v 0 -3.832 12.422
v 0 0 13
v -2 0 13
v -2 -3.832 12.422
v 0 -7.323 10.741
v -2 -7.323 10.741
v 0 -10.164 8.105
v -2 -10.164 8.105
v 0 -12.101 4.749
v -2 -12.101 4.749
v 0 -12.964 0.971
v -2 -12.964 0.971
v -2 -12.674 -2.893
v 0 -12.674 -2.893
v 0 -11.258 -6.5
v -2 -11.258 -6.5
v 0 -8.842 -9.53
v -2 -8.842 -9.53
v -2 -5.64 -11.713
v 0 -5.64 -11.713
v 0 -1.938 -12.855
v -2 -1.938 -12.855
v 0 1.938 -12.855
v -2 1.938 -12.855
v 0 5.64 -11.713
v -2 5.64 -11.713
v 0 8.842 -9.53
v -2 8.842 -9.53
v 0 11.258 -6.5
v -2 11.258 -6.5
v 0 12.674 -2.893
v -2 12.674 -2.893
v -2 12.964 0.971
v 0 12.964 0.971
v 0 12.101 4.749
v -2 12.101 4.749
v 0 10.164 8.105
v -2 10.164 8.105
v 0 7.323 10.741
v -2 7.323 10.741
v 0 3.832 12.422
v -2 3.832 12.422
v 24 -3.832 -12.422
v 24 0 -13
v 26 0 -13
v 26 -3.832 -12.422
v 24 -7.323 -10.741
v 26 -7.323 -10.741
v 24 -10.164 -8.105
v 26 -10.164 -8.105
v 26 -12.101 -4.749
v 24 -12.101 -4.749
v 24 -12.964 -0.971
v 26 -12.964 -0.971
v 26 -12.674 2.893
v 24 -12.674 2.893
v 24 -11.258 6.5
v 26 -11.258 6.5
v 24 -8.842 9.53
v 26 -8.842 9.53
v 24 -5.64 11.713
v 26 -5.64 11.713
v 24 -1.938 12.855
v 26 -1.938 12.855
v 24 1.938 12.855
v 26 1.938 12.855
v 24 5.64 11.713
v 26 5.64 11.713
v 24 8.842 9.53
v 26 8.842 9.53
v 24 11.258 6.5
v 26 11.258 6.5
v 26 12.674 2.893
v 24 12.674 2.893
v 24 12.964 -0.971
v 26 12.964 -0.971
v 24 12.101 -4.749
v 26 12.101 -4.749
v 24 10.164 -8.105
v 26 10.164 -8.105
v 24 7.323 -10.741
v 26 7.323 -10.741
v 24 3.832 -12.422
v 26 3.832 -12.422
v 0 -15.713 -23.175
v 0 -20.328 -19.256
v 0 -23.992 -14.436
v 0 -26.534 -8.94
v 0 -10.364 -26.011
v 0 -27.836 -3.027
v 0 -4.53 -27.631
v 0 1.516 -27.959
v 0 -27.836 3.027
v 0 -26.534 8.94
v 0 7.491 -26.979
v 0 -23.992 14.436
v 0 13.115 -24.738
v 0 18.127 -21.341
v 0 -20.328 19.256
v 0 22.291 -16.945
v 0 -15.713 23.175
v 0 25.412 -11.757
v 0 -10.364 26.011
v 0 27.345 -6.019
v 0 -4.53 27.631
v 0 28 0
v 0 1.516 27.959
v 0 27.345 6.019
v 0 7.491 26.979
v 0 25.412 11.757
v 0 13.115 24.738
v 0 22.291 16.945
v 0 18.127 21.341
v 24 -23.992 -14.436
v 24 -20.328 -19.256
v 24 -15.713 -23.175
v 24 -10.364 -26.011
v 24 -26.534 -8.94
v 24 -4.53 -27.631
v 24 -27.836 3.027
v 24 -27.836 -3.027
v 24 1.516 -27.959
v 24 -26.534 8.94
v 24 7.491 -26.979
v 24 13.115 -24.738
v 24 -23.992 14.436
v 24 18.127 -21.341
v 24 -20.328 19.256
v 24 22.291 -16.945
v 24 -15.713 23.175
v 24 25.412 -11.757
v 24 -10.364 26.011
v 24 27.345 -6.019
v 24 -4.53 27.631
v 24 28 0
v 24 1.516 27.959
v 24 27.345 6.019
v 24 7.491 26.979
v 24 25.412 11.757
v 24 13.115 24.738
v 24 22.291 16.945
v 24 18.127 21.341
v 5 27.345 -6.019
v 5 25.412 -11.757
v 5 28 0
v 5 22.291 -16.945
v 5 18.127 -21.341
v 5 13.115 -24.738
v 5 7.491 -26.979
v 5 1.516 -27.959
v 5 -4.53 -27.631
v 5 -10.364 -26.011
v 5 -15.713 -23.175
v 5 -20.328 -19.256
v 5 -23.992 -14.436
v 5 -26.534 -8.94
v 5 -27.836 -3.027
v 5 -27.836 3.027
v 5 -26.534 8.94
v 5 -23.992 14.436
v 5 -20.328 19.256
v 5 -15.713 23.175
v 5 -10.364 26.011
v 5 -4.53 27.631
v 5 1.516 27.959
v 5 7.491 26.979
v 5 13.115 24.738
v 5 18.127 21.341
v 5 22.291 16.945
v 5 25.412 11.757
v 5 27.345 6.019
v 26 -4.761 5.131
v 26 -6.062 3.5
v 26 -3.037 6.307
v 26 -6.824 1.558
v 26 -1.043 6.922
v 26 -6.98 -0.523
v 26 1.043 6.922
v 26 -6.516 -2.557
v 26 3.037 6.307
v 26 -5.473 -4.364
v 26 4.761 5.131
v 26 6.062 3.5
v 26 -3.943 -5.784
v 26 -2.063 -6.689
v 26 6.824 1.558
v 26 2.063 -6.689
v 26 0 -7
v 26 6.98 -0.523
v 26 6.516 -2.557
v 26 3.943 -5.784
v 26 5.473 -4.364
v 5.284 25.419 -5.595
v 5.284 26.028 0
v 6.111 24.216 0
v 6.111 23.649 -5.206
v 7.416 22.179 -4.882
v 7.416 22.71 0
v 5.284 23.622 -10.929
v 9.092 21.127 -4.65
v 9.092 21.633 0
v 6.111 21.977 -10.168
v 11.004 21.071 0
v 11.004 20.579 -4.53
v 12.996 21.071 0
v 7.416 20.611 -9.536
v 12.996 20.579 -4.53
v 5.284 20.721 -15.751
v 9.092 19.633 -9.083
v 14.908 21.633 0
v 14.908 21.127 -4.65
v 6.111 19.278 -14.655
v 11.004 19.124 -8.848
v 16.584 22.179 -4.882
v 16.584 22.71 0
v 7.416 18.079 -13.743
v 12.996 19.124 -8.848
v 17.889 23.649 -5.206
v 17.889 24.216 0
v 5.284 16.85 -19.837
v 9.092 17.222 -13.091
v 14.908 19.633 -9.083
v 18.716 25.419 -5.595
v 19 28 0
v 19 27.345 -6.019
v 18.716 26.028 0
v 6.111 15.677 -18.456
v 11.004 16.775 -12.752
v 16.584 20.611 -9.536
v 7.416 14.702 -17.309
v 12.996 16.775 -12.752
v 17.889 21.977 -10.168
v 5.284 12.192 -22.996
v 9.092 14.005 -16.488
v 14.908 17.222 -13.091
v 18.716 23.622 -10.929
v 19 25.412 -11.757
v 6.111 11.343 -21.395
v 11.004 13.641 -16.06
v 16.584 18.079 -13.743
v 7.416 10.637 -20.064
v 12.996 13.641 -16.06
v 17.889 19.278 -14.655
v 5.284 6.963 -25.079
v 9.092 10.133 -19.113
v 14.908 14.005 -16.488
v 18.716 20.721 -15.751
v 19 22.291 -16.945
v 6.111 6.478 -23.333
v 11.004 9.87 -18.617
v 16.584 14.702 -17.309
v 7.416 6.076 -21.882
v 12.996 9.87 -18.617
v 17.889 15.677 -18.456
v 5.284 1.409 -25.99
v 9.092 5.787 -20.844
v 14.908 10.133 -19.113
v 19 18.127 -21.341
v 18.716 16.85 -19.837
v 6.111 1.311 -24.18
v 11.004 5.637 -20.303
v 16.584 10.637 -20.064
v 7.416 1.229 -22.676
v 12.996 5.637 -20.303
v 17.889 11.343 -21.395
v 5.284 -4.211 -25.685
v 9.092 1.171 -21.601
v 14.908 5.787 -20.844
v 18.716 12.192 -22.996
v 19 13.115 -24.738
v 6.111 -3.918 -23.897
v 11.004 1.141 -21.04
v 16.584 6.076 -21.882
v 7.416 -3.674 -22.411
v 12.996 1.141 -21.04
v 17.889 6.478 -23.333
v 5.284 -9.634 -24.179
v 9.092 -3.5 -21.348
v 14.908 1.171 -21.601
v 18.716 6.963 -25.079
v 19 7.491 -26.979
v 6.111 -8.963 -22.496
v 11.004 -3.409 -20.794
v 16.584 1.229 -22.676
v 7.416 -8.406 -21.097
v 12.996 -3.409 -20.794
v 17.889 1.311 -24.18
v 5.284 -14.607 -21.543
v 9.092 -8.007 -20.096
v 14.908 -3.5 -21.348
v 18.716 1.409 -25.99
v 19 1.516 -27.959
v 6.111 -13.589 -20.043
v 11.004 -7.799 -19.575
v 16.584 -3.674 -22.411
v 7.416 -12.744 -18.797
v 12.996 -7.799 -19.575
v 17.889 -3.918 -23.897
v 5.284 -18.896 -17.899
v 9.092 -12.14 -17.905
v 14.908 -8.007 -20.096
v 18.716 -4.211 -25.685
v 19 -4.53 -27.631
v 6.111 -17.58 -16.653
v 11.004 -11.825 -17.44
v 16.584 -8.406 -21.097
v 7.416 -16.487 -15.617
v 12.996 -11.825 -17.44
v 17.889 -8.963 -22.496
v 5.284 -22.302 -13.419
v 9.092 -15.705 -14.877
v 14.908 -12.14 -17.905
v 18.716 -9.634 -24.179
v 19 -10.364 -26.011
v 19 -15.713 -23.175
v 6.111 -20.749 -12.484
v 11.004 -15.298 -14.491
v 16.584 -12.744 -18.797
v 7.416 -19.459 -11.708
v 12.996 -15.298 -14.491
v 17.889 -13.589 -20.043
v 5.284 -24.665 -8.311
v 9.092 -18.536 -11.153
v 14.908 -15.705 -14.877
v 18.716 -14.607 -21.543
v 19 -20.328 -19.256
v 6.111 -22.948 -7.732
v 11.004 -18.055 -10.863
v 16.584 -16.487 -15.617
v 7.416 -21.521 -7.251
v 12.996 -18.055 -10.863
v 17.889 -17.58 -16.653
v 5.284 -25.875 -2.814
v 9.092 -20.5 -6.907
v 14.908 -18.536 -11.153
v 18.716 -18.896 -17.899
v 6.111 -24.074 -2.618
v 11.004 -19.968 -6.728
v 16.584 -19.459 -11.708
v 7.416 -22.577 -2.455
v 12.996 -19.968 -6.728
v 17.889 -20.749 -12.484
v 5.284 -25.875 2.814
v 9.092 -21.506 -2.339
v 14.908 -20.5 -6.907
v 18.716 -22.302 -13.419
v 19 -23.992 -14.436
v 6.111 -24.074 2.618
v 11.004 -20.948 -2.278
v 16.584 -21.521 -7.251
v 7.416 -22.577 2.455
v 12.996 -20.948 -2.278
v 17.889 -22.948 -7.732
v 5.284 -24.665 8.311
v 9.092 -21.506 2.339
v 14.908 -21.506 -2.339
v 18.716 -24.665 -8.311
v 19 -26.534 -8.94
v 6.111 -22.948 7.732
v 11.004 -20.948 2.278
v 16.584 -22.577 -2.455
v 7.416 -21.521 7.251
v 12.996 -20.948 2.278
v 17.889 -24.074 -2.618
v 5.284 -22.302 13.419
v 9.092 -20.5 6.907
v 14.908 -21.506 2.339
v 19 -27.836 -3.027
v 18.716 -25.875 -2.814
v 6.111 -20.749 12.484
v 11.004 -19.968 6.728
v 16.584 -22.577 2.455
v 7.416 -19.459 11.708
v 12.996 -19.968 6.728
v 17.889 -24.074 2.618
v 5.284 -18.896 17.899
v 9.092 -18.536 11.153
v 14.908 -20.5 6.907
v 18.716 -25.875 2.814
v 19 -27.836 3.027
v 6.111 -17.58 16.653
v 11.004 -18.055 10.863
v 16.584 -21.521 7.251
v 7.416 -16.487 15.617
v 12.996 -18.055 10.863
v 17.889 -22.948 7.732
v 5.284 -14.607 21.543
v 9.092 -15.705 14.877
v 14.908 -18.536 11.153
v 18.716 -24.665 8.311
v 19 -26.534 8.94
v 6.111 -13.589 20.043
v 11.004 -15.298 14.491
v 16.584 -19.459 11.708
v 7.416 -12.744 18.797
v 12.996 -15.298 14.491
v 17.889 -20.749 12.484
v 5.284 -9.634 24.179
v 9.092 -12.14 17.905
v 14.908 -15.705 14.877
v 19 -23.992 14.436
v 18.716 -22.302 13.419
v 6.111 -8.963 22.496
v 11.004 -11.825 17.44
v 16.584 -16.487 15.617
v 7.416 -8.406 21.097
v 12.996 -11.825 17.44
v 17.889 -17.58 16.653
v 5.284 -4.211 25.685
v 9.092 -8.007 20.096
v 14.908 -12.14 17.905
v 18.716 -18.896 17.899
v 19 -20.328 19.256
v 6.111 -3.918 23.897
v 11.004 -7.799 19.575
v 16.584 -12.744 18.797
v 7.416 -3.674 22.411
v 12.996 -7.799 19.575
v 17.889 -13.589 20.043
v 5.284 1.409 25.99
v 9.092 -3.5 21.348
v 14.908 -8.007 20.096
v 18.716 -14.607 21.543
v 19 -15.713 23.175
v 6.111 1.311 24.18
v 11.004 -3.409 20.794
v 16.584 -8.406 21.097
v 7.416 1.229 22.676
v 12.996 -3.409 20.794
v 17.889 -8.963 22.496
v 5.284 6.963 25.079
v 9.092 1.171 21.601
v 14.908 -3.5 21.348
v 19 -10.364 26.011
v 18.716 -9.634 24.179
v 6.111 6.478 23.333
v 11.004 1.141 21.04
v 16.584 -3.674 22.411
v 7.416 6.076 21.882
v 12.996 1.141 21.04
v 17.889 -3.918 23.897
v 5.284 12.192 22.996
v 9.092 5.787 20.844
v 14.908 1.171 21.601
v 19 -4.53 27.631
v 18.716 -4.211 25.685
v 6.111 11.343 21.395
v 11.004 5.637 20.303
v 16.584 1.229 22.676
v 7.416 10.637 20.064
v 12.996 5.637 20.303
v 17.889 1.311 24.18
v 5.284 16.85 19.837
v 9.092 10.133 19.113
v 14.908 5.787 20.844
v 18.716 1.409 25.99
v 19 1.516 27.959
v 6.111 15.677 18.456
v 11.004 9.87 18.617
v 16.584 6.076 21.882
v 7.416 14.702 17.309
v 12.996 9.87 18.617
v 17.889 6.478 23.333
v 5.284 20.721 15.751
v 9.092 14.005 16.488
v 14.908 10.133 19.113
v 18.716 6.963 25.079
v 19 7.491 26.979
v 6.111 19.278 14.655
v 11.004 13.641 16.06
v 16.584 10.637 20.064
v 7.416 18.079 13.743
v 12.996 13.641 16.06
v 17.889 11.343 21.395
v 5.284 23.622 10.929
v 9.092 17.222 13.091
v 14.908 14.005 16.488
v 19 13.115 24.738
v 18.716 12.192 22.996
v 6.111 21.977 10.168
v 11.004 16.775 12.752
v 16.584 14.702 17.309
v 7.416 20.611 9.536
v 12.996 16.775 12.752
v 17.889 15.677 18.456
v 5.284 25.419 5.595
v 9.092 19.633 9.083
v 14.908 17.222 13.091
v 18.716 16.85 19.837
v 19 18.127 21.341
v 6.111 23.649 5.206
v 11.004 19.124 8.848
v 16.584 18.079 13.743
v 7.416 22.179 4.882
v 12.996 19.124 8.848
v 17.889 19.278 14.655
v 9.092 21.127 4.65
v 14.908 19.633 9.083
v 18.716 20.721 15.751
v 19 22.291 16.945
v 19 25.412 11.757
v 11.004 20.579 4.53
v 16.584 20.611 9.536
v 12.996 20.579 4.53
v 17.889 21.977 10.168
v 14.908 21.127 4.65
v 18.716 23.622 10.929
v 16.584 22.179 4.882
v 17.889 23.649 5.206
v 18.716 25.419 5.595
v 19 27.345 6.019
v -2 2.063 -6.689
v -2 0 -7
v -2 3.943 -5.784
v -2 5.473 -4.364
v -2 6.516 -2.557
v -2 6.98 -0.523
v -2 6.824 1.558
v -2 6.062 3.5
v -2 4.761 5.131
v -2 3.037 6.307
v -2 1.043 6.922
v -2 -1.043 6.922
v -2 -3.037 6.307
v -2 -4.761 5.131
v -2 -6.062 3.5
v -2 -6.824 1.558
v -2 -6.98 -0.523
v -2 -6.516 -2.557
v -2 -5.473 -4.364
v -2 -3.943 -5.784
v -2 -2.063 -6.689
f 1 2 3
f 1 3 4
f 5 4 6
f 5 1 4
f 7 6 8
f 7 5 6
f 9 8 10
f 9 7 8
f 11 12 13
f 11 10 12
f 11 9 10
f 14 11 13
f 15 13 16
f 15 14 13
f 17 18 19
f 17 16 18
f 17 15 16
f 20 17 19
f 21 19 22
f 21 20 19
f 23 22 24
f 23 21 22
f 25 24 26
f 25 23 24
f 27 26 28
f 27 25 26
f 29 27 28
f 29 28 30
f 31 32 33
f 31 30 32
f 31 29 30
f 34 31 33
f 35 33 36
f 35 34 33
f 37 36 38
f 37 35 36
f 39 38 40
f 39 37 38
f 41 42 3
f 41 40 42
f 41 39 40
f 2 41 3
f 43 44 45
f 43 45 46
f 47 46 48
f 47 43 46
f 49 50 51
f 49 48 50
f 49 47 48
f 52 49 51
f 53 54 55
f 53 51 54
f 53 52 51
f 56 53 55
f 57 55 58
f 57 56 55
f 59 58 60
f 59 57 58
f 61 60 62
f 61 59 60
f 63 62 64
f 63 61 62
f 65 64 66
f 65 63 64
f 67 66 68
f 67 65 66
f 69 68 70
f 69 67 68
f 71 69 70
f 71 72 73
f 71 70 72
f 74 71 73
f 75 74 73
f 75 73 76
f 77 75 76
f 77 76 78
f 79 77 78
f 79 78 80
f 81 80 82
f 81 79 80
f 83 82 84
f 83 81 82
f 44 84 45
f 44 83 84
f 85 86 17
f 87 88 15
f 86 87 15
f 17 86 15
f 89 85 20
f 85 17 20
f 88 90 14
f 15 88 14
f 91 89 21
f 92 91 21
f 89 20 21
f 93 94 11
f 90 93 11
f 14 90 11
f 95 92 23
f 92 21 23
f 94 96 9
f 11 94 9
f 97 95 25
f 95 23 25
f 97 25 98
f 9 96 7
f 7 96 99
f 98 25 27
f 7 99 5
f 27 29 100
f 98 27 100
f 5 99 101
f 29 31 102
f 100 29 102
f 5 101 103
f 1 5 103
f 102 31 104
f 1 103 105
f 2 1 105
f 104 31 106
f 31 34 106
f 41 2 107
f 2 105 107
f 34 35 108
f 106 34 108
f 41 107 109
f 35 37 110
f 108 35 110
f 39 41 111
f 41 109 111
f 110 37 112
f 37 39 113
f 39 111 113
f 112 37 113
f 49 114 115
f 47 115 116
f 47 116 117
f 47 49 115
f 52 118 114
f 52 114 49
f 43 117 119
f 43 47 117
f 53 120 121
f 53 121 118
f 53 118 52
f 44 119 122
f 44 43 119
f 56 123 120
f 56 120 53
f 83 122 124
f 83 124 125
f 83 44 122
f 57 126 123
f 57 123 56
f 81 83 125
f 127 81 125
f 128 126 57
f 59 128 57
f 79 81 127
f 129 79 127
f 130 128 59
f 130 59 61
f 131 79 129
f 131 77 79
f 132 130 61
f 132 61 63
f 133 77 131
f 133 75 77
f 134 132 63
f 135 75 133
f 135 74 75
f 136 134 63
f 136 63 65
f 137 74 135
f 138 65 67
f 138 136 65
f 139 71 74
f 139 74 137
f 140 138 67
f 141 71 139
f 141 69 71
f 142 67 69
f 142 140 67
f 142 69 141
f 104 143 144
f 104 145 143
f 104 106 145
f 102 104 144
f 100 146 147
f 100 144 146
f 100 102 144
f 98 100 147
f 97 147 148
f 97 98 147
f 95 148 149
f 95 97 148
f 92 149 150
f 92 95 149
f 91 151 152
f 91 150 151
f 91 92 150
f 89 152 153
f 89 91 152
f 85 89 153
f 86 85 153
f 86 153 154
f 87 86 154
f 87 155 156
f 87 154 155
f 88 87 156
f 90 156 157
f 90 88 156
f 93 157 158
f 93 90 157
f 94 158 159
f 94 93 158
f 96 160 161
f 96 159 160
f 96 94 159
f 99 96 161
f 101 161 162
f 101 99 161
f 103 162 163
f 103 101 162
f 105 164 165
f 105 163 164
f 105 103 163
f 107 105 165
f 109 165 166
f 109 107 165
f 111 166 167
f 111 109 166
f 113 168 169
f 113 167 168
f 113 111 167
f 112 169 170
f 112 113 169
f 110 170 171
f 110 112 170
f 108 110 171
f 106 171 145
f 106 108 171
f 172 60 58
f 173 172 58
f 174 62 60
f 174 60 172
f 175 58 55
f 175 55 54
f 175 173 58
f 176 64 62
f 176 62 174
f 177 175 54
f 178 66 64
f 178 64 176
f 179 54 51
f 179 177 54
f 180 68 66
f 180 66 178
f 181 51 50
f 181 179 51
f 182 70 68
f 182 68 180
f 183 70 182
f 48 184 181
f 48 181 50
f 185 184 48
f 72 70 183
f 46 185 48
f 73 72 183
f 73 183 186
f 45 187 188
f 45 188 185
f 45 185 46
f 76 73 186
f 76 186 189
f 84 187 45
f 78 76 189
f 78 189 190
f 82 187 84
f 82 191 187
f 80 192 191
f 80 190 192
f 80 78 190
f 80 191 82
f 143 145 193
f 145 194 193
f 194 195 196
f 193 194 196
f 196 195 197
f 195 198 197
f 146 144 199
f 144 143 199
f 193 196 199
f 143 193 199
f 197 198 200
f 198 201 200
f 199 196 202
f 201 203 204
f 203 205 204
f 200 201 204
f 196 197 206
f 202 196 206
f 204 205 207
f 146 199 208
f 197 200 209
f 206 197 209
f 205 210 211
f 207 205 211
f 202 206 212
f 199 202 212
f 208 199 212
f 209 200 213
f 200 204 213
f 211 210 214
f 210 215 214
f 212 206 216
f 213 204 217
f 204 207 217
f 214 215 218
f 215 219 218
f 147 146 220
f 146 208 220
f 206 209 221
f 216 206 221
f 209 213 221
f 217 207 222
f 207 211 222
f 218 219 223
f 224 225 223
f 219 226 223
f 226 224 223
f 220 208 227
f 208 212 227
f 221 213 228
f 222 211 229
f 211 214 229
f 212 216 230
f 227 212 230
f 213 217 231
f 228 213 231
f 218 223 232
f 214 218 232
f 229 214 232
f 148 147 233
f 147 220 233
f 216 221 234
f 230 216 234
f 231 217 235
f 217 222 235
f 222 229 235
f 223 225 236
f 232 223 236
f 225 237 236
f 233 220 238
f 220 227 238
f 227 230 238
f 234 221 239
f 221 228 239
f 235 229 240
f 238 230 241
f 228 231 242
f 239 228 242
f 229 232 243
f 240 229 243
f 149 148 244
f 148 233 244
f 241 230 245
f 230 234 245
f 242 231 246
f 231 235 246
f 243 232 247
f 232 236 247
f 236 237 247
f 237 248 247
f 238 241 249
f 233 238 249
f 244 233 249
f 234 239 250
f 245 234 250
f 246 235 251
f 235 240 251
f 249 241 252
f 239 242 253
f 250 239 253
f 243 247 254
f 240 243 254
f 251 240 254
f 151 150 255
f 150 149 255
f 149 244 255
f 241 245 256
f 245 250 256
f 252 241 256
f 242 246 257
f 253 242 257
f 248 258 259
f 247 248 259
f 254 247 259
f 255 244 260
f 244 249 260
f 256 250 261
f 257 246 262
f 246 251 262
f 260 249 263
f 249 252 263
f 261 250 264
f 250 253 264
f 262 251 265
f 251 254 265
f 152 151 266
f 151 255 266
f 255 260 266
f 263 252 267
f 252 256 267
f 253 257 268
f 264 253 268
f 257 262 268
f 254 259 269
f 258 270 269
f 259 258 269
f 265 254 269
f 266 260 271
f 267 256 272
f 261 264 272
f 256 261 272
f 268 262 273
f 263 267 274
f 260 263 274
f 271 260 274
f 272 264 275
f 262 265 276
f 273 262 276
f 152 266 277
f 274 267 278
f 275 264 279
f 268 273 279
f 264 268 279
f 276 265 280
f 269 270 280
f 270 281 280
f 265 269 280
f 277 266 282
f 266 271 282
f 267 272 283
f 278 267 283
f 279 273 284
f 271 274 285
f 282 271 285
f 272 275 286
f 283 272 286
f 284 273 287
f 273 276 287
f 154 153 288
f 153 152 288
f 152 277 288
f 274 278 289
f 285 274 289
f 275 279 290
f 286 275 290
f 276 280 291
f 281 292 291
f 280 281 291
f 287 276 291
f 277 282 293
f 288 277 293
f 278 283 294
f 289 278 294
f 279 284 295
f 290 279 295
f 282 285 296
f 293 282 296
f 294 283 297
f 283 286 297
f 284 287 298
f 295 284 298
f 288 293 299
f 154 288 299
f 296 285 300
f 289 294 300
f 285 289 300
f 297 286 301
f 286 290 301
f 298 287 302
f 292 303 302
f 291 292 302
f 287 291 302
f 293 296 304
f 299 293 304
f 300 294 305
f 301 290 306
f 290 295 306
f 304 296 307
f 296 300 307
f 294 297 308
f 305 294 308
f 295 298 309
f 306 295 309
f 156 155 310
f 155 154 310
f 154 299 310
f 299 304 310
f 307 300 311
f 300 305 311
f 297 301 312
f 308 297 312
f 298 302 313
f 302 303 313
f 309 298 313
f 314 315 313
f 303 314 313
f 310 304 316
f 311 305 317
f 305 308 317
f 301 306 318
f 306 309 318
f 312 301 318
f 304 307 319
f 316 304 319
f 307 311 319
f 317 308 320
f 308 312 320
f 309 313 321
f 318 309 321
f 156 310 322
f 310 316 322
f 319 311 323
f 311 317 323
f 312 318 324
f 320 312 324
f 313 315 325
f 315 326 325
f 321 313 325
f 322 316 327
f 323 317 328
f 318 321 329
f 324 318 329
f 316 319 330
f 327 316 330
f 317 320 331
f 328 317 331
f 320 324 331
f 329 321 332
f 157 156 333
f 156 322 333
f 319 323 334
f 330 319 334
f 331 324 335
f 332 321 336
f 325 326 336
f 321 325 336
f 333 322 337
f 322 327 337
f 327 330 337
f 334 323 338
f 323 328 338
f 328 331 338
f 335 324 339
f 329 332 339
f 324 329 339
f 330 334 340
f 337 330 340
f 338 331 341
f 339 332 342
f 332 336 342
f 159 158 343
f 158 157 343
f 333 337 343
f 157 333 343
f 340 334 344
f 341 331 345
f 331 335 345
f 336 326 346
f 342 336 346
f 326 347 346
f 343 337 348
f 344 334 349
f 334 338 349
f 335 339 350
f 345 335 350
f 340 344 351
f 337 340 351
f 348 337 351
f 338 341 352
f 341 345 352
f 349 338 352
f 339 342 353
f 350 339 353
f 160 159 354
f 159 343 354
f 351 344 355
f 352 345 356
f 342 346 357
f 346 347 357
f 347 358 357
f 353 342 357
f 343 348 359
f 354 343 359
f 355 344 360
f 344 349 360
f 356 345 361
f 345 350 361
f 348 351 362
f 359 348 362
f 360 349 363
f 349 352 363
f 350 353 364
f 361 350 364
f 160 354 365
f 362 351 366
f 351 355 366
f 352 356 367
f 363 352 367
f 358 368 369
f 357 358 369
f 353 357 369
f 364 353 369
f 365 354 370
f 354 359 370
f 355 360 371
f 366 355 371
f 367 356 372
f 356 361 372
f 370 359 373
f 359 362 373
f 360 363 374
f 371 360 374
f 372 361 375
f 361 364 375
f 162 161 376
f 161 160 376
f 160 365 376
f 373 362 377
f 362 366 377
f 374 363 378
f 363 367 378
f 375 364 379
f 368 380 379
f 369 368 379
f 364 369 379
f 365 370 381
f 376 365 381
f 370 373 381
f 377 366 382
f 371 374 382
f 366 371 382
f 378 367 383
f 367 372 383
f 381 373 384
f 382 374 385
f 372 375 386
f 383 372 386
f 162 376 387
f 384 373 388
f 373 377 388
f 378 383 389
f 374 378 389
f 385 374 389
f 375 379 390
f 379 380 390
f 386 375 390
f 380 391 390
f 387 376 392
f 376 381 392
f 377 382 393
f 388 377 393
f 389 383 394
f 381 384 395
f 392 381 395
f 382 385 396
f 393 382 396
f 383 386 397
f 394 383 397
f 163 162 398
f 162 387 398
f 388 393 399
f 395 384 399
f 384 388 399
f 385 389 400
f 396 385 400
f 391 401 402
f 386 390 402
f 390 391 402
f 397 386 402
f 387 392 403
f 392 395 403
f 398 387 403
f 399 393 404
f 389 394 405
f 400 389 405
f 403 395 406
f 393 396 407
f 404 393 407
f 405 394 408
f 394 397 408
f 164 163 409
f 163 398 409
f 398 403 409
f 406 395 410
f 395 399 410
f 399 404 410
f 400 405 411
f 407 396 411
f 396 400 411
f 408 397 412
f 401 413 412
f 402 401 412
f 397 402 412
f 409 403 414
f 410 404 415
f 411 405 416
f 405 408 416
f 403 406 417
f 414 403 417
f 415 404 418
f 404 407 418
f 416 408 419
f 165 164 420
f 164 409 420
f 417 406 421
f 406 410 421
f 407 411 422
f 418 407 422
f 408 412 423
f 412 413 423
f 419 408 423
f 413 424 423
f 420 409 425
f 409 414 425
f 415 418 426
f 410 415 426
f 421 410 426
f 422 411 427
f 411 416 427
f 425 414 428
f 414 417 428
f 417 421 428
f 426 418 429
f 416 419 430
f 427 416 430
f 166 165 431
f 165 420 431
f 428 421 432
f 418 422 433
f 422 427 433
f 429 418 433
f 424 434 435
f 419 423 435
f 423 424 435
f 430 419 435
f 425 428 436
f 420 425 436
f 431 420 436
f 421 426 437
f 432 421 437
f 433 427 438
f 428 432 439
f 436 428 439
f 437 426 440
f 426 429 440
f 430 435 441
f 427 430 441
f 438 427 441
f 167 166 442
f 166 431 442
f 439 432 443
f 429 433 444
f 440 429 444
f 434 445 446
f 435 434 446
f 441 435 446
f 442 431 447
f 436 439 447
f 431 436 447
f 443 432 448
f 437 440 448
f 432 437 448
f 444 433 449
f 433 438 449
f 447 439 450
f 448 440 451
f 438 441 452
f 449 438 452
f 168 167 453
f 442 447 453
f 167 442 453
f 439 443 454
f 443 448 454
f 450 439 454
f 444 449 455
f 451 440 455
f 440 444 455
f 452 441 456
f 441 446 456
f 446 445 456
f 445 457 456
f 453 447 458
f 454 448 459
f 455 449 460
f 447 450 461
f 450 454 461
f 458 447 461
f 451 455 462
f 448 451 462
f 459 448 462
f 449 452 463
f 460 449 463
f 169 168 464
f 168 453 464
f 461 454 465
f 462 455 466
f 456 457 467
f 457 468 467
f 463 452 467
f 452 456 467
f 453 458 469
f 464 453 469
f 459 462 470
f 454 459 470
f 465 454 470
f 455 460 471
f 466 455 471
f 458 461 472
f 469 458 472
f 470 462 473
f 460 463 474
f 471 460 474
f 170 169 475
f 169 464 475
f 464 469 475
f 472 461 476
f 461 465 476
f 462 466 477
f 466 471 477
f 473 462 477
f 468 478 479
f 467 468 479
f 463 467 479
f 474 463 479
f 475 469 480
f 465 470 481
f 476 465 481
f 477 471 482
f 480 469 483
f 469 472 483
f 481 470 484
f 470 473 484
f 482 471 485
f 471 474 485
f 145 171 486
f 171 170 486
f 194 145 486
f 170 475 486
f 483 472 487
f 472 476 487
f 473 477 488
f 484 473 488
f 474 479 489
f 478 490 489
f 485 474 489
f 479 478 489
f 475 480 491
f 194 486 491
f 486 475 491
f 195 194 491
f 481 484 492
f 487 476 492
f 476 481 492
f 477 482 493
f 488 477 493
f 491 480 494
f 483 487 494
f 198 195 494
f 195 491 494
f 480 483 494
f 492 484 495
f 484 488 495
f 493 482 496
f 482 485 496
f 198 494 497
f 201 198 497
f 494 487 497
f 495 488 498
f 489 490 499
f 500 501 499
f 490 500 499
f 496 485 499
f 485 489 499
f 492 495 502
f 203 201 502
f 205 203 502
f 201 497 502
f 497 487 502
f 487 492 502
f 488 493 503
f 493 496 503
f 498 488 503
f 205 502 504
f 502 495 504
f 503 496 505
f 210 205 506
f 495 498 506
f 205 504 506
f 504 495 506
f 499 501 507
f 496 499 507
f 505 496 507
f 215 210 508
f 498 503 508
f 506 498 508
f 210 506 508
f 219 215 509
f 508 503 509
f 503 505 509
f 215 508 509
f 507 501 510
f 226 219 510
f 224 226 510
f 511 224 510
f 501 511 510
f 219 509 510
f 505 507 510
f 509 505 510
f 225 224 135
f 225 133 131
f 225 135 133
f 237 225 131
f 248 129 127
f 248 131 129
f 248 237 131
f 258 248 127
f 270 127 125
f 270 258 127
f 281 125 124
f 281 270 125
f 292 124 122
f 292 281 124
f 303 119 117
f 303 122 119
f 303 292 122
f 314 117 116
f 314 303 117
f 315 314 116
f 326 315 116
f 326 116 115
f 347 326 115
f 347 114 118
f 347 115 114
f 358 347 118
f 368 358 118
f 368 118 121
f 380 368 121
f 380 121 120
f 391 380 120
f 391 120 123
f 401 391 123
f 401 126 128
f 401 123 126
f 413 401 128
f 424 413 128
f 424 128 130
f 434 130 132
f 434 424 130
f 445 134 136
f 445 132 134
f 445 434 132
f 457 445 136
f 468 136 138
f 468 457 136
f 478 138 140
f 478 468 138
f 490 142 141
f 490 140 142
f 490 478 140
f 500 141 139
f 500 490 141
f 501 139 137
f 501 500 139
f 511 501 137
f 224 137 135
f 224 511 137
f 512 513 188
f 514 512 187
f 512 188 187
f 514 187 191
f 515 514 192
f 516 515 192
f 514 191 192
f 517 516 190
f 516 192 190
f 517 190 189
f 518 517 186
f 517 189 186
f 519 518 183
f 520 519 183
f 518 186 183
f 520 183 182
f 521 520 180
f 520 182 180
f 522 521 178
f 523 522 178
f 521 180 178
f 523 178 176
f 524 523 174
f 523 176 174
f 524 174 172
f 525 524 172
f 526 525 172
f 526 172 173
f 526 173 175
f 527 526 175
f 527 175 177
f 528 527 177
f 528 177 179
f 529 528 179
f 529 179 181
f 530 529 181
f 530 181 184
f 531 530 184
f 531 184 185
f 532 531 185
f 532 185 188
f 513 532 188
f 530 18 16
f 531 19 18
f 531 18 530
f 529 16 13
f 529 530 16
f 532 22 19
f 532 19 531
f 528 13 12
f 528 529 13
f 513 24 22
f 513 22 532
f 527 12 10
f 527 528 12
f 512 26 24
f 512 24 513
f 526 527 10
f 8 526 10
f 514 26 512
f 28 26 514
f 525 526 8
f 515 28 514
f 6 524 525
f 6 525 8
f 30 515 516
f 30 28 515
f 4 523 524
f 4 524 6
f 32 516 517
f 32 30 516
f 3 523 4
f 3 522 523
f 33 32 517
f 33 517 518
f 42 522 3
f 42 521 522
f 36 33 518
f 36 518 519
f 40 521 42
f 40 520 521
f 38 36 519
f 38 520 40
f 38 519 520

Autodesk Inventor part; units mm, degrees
ref_plane "YZ Plane" through (0, 0, 0) normal (1, 0, 0) x (0, 1, 0)
ref_plane "XZ Plane" through (0, 0, 0) normal (0, 1, 0) x (-1, 0, 0)
ref_plane "XY Plane" through (0, 0, 0) normal (0, 0, 1) x (1, 0, 0)
sketch "Sketch1" plane through (0, 0, 0) normal (1, 0, 0) x (0, 1, 0)
  circle A0 centre (0, 0) radius 28
  dimension "d0" = 56
extrude "Extrusion1" add sketch "Sketch1" along normal blind 24
sketch "Sketch2" plane through (24, 0, 0) normal (1, 0, 0) x (0, 0, -1)
  circle A0 centre (0, 0) radius 13
  dimension "d3" = 26
extrude "Extrusion2" add sketch "Sketch2" along normal blind 2
sketch "Sketch3" plane through (0, 0, 0) normal (-1, 0, 0) x (0, 0, 1)
  circle A0 centre (0, 0) radius 13
  dimension "d6" = 26
extrude "Extrusion3" add sketch "Sketch3" along normal blind 2
sketch "Sketch8" plane through (0, 0, 0) normal (0, 0, 1) x (1, 0, 0)
  line L0 (0, 28) -> (24, 28) projected
  circle A0 centre (12, 28) radius 7
  line L1 (-19.1925, 0) -> (68.2113, 0)
  point P0 (0, 0)
  dimension "d14" = 14
revolve "Revolution1" cut sketch "Sketch8" angle 360 about axis through (-19.1925, 0, 0) along (1, 0, 0)
sketch "Sketch9" plane through (26, 0, 0) normal (1, 0, 0) x (0, 0, -1)
  circle A0 centre (0, 0) radius 7
  dimension "d16" = 14
extrude "Extrusion4" cut sketch "Sketch9" against normal blind 30
properties part number "Roue" material "Aluminum 6061-AHC"
